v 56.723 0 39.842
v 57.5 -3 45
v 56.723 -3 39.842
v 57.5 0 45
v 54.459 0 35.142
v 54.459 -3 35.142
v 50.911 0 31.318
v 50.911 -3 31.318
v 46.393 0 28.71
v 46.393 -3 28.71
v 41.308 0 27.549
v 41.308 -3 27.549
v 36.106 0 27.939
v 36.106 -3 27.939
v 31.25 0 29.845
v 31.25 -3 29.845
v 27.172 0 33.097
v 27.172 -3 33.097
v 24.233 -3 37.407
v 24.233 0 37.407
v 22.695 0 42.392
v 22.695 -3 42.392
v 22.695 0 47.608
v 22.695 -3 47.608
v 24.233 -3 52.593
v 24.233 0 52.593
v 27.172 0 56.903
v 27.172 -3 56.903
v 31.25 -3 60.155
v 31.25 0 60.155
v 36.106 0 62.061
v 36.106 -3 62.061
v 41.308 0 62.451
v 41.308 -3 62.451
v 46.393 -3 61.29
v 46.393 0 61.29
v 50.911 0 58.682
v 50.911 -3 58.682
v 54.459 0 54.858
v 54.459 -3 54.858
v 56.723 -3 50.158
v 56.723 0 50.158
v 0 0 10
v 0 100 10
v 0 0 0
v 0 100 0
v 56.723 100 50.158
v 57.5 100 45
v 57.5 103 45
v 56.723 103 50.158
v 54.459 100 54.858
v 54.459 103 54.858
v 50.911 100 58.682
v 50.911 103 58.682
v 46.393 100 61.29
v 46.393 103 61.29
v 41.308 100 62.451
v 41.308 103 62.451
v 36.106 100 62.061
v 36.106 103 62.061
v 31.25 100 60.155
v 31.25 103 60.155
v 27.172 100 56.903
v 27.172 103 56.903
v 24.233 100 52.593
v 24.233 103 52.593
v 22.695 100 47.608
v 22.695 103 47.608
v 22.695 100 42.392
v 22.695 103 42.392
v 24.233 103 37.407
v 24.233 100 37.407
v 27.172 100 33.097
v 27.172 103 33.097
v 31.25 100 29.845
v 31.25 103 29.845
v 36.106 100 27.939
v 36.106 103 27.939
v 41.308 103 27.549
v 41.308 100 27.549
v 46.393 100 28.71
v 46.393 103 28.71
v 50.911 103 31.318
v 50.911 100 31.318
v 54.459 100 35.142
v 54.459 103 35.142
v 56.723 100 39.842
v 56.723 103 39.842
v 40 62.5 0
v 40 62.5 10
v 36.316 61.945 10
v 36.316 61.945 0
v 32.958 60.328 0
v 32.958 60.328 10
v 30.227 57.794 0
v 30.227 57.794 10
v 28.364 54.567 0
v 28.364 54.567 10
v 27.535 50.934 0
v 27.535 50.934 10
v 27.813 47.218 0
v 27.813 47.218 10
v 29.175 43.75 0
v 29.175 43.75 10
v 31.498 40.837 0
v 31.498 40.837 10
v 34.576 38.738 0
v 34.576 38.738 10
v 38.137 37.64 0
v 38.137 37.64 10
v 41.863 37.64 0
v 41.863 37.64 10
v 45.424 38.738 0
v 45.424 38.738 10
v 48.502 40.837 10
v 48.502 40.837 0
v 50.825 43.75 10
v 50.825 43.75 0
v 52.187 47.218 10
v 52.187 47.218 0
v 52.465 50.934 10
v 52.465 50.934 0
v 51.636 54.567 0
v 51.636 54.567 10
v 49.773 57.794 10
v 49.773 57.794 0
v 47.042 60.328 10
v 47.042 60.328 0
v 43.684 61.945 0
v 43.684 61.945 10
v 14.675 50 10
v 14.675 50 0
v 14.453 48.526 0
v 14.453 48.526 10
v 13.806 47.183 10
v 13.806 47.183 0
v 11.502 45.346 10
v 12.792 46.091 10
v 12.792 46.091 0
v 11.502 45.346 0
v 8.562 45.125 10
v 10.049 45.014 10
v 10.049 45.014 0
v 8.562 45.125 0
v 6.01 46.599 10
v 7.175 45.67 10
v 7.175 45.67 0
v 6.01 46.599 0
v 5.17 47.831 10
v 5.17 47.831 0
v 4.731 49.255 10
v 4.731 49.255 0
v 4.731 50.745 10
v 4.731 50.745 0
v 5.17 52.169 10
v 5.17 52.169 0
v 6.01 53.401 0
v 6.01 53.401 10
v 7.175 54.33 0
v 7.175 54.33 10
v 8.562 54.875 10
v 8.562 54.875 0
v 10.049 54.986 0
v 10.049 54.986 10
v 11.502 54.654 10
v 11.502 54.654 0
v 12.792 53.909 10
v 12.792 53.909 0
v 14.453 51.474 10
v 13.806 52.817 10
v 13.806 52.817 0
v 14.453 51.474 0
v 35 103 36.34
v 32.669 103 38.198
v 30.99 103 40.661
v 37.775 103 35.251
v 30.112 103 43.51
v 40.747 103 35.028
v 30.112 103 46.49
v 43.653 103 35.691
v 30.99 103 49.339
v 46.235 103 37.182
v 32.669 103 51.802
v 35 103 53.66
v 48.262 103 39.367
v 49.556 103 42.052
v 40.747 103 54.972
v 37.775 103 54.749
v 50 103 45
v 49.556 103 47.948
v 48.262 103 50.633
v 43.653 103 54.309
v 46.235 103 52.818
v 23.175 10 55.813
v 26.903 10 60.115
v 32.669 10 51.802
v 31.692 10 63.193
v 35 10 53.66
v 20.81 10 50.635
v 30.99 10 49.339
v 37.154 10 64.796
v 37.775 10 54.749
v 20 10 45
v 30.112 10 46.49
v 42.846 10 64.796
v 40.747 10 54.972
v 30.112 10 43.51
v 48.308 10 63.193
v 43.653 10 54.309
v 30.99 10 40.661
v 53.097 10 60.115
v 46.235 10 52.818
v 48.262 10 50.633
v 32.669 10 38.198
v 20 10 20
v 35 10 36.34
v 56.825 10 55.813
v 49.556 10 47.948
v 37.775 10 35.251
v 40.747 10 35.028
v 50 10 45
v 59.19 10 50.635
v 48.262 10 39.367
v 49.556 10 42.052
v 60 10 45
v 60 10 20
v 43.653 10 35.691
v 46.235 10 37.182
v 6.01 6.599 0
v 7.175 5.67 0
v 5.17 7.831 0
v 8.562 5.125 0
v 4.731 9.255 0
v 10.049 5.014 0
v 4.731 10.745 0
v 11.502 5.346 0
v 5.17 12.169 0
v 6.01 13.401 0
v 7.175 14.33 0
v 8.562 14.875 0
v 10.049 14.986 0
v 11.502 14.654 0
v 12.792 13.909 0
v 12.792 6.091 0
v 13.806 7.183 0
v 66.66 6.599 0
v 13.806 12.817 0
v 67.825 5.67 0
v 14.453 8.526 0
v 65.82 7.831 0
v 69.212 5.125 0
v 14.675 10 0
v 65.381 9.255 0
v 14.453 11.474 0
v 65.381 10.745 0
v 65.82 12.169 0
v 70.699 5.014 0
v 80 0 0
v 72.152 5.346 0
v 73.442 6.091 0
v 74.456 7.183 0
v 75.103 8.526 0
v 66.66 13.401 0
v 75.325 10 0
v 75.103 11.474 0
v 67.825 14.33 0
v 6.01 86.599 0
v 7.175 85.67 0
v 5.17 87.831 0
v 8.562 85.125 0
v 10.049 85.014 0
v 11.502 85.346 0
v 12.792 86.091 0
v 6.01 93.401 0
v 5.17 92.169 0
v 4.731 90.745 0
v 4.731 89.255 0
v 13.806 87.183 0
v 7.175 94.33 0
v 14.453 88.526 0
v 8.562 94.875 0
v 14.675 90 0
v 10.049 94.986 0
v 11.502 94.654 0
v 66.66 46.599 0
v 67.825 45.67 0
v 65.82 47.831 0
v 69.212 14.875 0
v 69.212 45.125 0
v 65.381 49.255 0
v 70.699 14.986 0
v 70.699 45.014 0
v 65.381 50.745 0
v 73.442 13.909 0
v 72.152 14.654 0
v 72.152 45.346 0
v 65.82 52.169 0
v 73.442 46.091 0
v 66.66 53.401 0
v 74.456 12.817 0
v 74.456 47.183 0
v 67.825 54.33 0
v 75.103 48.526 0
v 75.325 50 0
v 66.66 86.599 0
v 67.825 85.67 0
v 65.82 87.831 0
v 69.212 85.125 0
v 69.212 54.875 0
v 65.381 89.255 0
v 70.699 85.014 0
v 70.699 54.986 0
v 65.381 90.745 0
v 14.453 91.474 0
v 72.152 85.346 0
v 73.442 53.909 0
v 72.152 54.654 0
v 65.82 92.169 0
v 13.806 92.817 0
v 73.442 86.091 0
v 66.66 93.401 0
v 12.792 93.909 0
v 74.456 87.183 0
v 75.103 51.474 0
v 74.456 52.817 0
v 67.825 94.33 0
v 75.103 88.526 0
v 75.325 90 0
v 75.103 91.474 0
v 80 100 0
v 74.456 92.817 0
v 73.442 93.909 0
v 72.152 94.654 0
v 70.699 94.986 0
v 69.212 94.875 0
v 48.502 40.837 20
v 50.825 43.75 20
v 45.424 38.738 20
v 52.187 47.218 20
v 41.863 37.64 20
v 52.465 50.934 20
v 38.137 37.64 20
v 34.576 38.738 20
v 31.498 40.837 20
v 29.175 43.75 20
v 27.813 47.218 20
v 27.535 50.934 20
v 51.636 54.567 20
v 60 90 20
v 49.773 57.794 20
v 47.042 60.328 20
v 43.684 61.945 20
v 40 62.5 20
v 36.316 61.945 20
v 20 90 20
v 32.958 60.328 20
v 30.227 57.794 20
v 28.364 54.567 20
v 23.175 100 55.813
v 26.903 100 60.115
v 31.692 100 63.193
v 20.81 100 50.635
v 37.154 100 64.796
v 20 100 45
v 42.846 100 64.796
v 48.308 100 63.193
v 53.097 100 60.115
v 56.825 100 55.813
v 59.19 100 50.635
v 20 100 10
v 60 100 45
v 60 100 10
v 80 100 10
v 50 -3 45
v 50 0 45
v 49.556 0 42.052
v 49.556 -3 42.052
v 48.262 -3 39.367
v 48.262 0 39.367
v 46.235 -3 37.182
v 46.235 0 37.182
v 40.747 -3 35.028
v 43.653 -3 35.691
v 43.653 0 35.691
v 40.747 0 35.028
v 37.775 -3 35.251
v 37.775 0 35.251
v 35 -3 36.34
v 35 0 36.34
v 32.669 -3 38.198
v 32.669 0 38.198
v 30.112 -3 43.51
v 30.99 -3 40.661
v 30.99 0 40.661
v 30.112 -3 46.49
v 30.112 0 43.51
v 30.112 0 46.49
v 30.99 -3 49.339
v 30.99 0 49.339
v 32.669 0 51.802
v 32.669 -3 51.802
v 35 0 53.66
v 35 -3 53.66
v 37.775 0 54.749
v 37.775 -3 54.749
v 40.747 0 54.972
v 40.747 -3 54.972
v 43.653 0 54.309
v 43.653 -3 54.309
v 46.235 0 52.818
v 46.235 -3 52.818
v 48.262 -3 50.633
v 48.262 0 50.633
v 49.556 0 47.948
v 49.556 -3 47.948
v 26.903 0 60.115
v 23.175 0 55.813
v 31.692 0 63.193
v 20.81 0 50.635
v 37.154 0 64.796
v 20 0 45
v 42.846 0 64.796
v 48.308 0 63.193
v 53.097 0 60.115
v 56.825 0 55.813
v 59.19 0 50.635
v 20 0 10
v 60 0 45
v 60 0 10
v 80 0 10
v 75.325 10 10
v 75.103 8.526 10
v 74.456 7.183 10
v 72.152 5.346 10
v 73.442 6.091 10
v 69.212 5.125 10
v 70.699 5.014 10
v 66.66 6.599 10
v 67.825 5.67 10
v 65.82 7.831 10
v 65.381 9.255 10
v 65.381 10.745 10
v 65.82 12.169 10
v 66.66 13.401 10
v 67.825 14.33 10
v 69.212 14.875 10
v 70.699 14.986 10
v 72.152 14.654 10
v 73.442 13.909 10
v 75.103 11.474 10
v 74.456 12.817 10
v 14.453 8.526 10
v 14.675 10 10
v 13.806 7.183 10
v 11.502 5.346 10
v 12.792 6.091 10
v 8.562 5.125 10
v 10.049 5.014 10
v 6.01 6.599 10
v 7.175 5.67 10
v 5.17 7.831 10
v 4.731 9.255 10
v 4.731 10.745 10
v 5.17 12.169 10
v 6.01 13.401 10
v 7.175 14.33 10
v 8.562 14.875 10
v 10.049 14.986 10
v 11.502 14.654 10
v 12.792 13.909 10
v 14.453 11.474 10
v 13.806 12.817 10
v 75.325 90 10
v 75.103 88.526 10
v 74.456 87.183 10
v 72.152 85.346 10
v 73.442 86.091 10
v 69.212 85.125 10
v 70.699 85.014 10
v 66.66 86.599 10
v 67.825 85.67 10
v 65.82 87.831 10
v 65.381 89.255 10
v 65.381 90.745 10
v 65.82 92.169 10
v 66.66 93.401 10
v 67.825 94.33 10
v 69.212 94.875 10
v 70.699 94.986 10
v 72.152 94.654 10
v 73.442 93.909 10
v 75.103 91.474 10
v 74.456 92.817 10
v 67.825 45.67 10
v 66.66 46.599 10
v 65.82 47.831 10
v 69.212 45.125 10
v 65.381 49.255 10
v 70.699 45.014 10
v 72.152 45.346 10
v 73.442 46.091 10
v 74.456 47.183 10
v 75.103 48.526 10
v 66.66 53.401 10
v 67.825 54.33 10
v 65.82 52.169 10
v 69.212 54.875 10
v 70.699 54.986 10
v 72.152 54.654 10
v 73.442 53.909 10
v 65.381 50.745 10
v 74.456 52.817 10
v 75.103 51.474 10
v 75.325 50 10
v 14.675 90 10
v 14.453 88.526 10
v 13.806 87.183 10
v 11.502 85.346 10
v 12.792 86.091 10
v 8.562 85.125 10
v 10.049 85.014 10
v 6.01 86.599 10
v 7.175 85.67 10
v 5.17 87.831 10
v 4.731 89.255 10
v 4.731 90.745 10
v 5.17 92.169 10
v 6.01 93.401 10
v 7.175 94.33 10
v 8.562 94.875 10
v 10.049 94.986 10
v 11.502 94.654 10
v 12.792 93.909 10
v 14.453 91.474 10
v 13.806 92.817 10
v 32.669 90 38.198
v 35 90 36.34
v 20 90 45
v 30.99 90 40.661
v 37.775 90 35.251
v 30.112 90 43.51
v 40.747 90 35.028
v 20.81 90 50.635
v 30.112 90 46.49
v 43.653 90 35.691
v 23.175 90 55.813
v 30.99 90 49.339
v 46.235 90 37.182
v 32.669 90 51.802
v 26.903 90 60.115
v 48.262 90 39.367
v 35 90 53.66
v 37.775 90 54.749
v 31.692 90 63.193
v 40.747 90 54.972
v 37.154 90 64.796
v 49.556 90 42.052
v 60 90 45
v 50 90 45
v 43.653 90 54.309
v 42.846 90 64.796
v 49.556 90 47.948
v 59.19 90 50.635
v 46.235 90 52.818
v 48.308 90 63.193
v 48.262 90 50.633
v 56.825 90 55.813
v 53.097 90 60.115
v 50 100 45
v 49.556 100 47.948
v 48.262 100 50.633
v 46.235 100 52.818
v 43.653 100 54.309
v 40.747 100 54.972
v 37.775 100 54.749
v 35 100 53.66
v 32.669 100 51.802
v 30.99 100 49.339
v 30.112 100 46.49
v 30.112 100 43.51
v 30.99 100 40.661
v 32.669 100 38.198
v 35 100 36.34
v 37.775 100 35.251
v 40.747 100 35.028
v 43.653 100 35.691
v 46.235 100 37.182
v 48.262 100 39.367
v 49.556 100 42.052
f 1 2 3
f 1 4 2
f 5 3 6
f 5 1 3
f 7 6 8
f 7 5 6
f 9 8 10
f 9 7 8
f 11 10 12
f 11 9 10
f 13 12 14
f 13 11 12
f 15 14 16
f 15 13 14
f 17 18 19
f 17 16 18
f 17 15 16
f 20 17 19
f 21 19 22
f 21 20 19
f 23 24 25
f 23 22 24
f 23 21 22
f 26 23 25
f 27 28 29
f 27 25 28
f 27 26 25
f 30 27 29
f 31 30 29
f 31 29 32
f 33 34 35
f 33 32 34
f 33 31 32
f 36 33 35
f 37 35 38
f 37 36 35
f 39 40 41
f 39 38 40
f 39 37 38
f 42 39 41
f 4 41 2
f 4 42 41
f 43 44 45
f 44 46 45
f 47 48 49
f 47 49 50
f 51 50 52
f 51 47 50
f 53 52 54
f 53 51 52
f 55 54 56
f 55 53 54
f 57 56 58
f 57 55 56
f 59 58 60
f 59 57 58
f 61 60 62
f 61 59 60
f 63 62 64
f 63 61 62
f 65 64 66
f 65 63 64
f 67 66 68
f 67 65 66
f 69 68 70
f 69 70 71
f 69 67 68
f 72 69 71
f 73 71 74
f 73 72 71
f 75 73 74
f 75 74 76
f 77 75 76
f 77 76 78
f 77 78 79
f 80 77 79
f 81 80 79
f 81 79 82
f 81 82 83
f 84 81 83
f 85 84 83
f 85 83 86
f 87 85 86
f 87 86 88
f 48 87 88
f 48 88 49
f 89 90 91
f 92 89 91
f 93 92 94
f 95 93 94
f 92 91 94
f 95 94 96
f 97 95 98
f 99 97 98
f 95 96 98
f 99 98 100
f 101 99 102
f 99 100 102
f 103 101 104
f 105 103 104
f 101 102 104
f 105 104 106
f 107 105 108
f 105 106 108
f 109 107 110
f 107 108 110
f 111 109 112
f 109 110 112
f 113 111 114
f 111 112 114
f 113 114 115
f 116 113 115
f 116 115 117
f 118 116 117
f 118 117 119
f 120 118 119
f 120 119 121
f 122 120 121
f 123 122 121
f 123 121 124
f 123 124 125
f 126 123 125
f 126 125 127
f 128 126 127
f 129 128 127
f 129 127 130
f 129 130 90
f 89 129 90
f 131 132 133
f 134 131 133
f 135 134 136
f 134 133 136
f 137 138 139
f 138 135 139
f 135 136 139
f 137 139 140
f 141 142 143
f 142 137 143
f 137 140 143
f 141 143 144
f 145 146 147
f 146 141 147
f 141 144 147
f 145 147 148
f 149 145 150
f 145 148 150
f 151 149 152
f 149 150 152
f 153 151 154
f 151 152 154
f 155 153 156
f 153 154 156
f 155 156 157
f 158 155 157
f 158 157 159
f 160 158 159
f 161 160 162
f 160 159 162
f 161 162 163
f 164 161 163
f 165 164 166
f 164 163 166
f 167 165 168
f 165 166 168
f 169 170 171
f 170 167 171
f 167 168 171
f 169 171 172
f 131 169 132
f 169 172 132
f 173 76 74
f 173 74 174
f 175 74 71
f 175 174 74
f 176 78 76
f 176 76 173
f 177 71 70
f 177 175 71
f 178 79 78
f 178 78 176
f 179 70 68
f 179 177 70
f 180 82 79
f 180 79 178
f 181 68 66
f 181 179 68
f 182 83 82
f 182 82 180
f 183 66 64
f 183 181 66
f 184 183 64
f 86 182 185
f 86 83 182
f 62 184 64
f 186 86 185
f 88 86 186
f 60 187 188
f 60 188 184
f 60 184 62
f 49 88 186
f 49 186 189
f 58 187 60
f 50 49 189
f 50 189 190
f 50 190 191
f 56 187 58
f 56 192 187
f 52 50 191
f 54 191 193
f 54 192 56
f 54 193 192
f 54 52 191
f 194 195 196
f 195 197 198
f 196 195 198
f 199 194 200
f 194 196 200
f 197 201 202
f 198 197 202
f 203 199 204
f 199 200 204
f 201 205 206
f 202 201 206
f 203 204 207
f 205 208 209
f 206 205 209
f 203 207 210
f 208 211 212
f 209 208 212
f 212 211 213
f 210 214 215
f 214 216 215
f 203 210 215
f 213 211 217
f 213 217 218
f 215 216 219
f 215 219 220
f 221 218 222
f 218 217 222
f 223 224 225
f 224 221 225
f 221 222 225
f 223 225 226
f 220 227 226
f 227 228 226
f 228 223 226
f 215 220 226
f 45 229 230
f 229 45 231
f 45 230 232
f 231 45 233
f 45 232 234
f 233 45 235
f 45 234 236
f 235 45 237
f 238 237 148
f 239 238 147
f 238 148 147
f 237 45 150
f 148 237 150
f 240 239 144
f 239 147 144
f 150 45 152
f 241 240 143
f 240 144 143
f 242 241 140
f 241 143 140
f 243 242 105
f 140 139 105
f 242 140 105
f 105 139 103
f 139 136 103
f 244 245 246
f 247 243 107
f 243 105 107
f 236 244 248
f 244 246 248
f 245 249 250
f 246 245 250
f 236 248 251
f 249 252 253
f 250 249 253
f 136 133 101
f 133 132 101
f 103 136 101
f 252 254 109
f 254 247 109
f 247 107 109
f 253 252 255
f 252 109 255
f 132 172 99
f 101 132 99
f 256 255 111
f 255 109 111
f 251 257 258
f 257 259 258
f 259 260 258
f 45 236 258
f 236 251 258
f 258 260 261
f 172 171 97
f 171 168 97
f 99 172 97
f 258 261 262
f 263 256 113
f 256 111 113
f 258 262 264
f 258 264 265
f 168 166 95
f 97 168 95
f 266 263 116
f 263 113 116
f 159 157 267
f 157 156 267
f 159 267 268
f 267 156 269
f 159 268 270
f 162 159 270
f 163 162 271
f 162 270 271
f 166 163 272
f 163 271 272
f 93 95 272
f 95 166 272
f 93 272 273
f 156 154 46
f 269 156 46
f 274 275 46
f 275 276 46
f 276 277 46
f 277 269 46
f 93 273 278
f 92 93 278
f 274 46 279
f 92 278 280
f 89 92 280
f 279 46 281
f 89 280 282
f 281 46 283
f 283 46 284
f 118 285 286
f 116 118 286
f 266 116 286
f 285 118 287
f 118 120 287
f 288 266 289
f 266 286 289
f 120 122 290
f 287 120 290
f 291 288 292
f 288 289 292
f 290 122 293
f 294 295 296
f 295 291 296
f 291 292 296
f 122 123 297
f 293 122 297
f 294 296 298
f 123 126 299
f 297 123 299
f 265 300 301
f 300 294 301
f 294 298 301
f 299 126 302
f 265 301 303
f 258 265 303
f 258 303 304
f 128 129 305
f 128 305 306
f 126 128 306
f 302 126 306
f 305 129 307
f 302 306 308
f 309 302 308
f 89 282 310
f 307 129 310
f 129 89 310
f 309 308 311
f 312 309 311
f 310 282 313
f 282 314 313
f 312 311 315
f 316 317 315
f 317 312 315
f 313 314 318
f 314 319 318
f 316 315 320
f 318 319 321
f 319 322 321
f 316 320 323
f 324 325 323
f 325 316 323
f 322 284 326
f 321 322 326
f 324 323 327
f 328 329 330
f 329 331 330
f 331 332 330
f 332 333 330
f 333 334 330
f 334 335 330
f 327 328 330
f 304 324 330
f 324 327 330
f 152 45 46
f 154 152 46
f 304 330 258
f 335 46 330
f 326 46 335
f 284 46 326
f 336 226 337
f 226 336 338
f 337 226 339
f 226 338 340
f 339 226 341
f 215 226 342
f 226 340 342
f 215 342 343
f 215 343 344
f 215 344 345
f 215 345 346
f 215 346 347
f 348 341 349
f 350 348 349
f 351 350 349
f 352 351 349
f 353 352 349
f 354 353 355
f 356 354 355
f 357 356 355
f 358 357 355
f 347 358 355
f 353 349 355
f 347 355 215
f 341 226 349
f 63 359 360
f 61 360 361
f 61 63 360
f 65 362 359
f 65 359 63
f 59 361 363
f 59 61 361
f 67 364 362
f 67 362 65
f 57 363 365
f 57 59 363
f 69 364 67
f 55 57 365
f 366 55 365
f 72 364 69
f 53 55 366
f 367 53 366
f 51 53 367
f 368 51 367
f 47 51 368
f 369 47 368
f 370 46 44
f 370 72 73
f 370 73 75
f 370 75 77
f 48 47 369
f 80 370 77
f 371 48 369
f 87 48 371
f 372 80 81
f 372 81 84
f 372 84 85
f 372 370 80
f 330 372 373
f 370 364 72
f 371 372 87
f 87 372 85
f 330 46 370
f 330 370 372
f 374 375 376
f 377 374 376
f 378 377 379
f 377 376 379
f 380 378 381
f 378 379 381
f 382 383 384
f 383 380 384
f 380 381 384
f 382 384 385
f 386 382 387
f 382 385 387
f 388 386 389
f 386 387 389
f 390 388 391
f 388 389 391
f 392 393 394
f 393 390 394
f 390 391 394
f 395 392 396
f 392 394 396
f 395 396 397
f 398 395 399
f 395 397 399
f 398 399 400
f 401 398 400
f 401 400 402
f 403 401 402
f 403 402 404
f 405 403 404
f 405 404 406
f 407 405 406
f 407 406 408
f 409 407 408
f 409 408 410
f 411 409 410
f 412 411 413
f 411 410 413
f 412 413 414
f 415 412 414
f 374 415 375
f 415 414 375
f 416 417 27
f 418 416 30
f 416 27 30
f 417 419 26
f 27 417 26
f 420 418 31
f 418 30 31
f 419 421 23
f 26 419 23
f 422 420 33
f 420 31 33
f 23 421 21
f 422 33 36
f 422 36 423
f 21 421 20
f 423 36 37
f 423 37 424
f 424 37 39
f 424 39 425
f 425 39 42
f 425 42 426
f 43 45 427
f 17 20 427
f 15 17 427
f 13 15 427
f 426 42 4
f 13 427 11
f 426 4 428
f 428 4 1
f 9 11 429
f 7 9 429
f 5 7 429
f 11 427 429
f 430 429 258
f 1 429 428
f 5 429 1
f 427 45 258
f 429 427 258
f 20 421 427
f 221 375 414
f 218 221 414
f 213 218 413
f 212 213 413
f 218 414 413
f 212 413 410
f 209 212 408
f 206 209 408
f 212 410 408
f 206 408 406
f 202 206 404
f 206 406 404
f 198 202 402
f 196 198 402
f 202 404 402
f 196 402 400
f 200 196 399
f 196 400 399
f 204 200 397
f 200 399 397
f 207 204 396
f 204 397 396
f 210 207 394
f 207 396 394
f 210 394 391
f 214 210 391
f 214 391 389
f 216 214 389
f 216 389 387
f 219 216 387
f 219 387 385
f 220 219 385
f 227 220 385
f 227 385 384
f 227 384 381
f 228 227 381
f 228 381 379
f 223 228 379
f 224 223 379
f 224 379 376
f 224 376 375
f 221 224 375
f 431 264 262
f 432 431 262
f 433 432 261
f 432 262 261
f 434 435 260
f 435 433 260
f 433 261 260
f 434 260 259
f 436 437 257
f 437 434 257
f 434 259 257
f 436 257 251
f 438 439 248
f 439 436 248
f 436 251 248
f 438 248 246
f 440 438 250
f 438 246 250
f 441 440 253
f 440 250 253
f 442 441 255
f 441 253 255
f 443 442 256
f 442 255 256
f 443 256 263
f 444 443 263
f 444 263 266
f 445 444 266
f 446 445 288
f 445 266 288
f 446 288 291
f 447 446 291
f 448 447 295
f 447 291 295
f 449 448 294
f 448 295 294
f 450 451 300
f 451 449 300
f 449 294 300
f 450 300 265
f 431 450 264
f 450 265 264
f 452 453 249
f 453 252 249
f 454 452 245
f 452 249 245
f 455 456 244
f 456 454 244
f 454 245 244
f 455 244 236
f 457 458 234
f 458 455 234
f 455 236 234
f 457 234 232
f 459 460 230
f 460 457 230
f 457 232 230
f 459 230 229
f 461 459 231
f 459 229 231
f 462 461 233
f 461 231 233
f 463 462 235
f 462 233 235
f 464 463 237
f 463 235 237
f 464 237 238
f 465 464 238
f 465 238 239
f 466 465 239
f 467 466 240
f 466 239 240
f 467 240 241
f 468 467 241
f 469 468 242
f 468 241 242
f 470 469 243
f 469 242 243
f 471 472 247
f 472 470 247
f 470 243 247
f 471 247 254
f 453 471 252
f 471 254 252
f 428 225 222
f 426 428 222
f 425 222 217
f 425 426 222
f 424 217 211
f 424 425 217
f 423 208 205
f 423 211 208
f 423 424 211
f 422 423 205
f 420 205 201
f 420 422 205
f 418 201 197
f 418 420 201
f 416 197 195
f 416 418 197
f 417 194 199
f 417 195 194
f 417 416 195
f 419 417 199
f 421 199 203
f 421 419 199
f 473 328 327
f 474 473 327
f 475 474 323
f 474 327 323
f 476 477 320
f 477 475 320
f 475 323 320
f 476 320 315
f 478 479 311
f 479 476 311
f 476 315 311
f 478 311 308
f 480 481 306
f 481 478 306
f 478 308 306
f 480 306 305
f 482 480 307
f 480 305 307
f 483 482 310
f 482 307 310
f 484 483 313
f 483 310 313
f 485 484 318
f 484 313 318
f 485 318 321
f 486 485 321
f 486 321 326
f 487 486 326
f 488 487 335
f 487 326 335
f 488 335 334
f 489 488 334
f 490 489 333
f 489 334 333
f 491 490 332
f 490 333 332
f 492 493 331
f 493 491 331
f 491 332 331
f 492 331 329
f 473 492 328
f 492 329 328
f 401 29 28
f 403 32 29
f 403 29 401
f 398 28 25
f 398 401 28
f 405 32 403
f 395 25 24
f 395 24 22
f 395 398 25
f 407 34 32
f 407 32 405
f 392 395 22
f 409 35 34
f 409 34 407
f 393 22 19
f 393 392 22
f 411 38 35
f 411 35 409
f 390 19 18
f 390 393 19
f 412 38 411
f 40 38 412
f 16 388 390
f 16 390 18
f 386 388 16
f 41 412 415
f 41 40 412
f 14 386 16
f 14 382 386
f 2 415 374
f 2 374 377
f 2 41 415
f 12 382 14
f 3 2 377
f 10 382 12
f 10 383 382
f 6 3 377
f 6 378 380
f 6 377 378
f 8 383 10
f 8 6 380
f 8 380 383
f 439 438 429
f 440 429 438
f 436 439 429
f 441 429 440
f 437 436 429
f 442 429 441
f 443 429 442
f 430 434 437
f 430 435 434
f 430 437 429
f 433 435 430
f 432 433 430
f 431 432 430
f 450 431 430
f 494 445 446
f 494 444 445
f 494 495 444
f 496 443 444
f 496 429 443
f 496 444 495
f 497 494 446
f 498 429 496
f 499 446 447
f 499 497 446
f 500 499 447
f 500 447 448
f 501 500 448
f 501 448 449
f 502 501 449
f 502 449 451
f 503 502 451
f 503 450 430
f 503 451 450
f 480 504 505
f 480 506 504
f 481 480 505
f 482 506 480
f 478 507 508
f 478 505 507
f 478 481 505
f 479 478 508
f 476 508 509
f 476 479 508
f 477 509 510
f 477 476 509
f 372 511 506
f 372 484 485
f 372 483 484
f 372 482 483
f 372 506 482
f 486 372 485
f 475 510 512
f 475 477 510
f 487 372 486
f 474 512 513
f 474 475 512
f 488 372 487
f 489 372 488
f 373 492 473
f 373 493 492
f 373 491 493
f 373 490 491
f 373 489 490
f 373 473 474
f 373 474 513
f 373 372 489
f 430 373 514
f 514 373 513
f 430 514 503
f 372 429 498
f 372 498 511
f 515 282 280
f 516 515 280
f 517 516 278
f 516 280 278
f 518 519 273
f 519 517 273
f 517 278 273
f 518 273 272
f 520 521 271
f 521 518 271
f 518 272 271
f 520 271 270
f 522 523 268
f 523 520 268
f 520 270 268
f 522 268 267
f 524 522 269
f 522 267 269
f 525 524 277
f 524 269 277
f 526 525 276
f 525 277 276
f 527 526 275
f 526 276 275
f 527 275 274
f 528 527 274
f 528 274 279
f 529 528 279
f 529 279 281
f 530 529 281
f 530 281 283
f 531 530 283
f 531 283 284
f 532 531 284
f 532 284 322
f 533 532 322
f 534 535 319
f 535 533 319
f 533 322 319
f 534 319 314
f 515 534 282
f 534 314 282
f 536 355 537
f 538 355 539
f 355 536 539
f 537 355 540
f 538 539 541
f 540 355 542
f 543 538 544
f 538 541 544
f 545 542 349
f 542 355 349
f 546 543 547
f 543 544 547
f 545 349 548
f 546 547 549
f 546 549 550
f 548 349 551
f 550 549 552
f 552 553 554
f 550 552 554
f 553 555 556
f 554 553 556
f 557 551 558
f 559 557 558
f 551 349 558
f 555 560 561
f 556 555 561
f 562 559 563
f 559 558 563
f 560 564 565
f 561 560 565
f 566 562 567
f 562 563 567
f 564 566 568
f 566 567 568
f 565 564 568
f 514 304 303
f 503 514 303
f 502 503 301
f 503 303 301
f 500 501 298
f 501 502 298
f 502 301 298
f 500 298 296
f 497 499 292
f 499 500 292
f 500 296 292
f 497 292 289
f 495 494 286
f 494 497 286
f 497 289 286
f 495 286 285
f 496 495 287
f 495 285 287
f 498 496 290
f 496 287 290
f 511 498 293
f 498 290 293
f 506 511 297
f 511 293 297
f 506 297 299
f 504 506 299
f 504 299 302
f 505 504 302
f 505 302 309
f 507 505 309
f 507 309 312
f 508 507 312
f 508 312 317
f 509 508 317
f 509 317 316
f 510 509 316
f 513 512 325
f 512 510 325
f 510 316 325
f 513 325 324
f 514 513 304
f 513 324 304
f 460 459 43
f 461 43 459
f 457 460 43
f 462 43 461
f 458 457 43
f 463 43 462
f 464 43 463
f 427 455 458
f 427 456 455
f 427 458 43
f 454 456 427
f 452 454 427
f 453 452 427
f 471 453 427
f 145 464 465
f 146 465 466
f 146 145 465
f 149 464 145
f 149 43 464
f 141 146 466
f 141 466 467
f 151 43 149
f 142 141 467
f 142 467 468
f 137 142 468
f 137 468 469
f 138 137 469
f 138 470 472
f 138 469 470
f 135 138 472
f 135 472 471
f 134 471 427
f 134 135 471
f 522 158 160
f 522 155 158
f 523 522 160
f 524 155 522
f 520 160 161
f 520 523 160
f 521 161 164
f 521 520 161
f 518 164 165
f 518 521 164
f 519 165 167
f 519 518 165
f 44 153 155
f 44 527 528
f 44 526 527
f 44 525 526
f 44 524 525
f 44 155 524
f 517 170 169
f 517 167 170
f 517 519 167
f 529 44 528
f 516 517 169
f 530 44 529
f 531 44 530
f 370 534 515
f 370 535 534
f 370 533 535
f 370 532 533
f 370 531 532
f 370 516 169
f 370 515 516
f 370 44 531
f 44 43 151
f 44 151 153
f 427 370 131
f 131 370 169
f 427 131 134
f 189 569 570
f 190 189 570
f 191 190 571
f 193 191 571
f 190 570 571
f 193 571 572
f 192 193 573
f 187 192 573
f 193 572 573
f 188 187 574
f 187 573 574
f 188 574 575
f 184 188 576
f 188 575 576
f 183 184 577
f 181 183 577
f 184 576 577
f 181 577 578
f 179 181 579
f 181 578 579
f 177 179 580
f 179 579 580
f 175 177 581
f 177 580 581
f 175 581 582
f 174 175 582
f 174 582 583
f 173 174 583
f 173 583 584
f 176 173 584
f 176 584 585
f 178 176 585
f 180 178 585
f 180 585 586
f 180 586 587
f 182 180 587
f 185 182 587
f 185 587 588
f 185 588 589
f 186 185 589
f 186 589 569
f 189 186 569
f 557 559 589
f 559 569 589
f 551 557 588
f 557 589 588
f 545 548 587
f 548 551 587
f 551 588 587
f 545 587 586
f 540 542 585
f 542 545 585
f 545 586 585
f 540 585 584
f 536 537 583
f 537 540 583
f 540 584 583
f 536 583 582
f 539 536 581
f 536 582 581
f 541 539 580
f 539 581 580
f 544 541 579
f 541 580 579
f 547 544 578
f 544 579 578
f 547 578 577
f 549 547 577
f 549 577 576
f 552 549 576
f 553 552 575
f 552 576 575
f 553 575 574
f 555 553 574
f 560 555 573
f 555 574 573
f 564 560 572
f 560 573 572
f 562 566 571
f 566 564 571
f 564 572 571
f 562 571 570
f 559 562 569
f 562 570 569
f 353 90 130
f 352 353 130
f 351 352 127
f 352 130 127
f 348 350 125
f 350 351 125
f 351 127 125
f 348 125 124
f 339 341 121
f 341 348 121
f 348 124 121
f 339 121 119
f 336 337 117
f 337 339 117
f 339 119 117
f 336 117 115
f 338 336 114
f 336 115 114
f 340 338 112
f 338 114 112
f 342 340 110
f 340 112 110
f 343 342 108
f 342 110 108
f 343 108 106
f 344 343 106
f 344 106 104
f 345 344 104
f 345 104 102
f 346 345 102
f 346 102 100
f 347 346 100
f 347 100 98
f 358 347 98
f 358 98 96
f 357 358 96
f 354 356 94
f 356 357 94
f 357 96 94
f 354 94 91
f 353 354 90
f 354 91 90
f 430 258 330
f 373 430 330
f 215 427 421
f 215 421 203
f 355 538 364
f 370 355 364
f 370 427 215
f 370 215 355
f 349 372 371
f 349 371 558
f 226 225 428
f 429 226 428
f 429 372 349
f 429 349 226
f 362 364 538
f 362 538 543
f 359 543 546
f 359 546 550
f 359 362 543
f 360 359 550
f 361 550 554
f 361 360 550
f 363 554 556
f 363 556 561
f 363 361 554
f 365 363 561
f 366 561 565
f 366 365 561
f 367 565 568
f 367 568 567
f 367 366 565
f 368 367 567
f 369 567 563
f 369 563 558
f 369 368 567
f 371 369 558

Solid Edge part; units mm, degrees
sketch "Sketch1" plane through (0, 0, 0) normal (0, 0, 1) x (1, 0, 0)
  circle A0 centre (9.675, 10) radius 5
  circle A1 centre (9.675, 50) radius 5
  circle A2 centre (9.675, 90) radius 5
  circle A3 centre (70.325, 50) radius 5
  circle A4 centre (70.325, 90) radius 5
  circle A5 centre (70.325, 10) radius 5
  line L0 (0, 0) -> (80, 0)
  line L1 (80, 0) -> (80, 100)
  line L2 (0, 100) -> (80, 100)
  line L3 (0, 100) -> (0, 0)
extrude "Protrusion1" add sketch "Sketch1" along normal blind 10
sketch "Sketch2" plane through (40, 50, 10) normal (0, 0, 1) x (0, 1, 0)
  line L0 (-50, 20) -> (50, 20)
  line L1 (50, 20) -> (50, -20)
  line L2 (50, -20) -> (-50, -20)
  line L3 (-50, -20) -> (-50, 20)
extrude "ExtrudedProtrusion_2" add sketch "Sketch2" along normal blind 10
sketch "Sketch3" plane through (40, 50, 10) normal (0, 0, 1) x (0, 1, 0)
  circle A0 centre (0, 0) radius 12.5
extrude "ExtrudedCutout_1" cut sketch "Sketch3" along normal blind 10
sketch "Sketch4" plane through (40, 0, 10) normal (0, -1, 0) x (1, 0, 0)
  line L0 (20, 8) -> (20, 35)
  line L1 (-20, 35) -> (-20, 8)
  line L2 (-20, 8) -> (20, 8)
  arc A0 (-20, 35) -> (20, 35) centre (0, 35) cw
  circle A1 centre (0, 35) radius 10
extrude "ExtrudedCutout_6" cut sketch "Sketch4" against normal blind 10
sketch "Sketch5" plane through (40, 0, 10) normal (0, -1, 0) x (1, 0, 0)
  line L0 (20, 8) -> (20, 35)
  line L1 (-20, 35) -> (-20, 8)
  line L2 (-20, 8) -> (20, 8)
  arc A0 (-20, 35) -> (20, 35) centre (0, 35) cw
  circle A1 centre (0, 35) radius 10
extrude "ExtrudedProtrusion_3" add sketch "Sketch5" against normal blind 10
sketch "Sketch6" plane through (40, 0, 10) normal (0, -1, 0) x (1, 0, 0)
  circle A0 centre (0, 35) radius 17.5
  circle A1 centre (0, 35) radius 10
extrude "ExtrudedProtrusion_4" add sketch "Sketch6" along normal blind 3
mirror "Mirror1" about plane through (0, 50, 0) normal (0, -1, 0) of "ExtrudedProtrusion_3"
mirror "Mirror2" about plane through (0, 50, 0) normal (0, -1, 0) of "ExtrudedProtrusion_4"
sketch "Sketch7" plane through (40, 50, 10) normal (0, 0, 1) x (0, 1, 0)
  circle A0 centre (0, 0) radius 12.5
extrude "ExtrudedCutout_7" cut sketch "Sketch7" against normal blind 100
